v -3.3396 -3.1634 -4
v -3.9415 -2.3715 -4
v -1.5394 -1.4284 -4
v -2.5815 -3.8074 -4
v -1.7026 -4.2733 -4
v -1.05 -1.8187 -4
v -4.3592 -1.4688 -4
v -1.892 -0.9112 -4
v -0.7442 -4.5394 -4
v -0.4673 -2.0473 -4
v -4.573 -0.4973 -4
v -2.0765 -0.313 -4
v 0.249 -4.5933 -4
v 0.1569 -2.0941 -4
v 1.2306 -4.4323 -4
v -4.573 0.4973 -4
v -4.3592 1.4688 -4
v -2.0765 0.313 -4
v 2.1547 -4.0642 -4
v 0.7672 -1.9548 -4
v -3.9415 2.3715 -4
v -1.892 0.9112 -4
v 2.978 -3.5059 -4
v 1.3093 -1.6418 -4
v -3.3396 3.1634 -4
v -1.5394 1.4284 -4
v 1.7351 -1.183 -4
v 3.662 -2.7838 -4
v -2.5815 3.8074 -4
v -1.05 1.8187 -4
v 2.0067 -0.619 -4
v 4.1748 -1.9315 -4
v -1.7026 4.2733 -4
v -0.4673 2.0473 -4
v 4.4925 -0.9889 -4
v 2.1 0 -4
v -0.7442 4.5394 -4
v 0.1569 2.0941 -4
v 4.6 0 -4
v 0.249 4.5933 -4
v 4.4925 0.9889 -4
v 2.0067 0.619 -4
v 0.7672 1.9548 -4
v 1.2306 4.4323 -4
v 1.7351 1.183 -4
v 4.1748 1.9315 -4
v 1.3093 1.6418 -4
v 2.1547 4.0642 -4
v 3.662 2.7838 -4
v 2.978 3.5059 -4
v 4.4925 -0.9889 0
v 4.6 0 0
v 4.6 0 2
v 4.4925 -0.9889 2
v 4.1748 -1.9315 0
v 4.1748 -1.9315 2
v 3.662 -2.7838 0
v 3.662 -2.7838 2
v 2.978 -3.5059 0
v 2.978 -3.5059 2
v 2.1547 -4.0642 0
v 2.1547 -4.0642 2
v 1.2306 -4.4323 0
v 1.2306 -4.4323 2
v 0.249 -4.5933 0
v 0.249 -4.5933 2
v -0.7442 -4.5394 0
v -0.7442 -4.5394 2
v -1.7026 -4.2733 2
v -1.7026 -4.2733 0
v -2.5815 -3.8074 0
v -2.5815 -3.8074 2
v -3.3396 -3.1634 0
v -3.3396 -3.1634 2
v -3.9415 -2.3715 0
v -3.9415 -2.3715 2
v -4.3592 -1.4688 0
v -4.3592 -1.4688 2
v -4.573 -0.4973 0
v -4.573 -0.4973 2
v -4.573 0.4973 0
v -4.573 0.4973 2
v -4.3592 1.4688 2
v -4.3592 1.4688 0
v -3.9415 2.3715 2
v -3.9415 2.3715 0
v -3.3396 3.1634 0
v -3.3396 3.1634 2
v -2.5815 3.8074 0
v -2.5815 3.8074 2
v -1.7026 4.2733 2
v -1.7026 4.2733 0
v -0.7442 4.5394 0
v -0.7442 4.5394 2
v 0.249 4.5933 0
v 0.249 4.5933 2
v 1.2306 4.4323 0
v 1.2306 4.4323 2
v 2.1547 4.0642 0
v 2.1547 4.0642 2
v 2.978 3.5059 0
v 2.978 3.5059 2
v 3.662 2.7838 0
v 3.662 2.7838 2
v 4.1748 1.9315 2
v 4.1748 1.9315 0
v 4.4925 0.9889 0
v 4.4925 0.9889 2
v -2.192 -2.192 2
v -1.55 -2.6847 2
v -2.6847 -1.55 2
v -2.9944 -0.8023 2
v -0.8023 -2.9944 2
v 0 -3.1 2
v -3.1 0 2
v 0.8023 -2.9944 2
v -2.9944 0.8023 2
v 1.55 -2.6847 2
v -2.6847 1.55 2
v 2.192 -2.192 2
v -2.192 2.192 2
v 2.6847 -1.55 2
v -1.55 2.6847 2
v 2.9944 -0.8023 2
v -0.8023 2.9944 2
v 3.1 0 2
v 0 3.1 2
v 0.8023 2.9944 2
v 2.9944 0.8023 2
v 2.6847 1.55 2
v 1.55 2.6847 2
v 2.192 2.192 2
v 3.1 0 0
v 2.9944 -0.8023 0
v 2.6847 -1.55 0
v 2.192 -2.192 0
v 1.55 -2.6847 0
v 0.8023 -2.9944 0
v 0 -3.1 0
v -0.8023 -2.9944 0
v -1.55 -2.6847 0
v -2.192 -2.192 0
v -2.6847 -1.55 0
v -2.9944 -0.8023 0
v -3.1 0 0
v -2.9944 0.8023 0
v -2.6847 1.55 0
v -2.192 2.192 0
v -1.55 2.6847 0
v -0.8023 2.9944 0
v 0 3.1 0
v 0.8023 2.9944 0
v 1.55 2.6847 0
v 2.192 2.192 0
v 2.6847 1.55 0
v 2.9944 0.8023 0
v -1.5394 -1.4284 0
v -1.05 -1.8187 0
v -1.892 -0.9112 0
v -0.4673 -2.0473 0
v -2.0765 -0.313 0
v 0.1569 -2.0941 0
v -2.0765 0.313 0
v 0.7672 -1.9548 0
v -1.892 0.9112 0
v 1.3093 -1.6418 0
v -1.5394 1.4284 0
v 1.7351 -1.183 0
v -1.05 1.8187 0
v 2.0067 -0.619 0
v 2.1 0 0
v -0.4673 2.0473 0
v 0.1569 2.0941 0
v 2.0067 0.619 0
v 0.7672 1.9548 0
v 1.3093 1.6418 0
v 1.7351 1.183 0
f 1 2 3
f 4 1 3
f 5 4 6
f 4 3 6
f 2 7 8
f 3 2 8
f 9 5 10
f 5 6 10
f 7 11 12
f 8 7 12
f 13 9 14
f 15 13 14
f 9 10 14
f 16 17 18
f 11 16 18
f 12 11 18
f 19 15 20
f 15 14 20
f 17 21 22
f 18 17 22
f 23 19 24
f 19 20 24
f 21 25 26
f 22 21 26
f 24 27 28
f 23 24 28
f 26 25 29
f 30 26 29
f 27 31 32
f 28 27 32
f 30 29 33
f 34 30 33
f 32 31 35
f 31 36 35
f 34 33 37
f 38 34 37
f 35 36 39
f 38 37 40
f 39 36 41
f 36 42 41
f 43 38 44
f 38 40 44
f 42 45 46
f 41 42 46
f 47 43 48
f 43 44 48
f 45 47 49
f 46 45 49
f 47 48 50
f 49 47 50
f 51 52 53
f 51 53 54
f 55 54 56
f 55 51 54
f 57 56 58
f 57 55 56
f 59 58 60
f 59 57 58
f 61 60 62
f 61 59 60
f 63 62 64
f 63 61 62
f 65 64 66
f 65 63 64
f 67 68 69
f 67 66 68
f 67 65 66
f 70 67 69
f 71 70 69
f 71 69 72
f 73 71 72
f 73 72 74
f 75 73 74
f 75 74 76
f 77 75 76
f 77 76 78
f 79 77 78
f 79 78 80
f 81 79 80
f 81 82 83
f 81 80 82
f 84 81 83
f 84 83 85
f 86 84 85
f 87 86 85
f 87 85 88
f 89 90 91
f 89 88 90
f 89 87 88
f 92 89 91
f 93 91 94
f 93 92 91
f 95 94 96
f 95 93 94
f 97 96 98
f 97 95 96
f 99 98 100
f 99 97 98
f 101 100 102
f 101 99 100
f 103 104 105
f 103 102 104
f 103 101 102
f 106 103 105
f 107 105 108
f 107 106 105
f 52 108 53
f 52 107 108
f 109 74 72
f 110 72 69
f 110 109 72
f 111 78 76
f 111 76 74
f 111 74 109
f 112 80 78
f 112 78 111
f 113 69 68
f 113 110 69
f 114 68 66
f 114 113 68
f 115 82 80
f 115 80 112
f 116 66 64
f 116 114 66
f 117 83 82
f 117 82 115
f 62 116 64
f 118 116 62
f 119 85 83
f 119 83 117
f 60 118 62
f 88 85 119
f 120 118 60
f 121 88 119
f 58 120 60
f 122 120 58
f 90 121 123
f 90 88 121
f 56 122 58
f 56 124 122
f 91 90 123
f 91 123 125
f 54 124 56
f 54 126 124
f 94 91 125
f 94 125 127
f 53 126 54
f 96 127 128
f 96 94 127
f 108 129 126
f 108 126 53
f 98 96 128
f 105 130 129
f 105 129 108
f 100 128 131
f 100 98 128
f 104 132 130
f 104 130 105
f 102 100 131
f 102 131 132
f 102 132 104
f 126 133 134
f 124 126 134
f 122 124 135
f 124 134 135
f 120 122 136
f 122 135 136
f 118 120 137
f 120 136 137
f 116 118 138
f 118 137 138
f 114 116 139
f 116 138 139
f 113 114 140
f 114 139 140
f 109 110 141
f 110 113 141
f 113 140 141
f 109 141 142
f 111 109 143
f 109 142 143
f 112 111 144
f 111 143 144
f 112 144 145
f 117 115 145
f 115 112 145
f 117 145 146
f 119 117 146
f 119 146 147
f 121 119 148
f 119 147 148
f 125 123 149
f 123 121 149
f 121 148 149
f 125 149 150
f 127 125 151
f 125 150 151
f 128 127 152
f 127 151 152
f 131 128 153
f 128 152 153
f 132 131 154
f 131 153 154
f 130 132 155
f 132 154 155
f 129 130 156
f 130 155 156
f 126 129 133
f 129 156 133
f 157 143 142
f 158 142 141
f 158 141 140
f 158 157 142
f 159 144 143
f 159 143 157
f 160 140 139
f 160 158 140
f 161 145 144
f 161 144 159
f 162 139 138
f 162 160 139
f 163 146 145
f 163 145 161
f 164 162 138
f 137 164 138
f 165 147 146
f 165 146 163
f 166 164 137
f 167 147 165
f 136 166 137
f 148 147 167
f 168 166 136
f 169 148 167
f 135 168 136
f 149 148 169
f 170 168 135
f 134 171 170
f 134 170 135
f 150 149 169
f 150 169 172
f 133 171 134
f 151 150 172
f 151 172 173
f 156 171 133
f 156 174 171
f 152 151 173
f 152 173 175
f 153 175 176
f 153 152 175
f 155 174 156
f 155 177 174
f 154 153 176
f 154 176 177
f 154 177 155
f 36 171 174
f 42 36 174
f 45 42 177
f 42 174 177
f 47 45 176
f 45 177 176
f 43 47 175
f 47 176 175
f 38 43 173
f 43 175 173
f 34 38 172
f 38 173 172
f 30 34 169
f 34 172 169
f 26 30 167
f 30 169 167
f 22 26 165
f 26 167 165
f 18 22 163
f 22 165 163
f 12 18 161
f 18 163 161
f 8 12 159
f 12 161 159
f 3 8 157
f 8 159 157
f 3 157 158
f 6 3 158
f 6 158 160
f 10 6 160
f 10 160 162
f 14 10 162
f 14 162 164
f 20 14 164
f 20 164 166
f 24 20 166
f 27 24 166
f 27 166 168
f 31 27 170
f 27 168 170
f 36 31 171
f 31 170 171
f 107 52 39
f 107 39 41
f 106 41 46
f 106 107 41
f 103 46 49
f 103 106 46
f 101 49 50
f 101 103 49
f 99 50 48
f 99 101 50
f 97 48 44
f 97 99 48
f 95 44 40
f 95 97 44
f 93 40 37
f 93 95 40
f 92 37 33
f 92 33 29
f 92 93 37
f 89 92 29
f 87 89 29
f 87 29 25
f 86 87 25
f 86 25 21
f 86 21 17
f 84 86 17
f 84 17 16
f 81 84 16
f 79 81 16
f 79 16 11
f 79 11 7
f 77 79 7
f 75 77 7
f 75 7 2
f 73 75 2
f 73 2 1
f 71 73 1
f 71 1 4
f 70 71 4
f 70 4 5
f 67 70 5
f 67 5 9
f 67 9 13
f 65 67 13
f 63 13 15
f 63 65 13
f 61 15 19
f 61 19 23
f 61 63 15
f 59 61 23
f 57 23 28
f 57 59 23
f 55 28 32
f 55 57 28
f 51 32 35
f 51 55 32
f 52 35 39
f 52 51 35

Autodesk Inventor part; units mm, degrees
ref_plane "YZ Plane" through (0, 0, 0) normal (1, 0, 0) x (0, 1, 0)
ref_plane "XZ Plane" through (0, 0, 0) normal (0, 1, 0) x (-1, 0, 0)
ref_plane "XY Plane" through (0, 0, 0) normal (0, 0, 1) x (1, 0, 0)
sketch "Skizze1" plane through (0, 0, 0) normal (0, 0, 1) x (1, 0, 0)
  circle A0 centre (0, 0) radius 3.1
  circle A1 centre (0, 0) radius 4.6
  circle A2 centre (0, 0) radius 2.1
  dimension "d0" = 6.2
  dimension "d1" = 1.5
  dimension "d2" = 4.2
extrude "Extrusion1" add sketch "Skizze1" against normal blind 4 contours A0 | A1
extrude "Extrusion2" add sketch "Skizze1" along normal blind 2 contours A1
properties part number "MagnetHolder"
